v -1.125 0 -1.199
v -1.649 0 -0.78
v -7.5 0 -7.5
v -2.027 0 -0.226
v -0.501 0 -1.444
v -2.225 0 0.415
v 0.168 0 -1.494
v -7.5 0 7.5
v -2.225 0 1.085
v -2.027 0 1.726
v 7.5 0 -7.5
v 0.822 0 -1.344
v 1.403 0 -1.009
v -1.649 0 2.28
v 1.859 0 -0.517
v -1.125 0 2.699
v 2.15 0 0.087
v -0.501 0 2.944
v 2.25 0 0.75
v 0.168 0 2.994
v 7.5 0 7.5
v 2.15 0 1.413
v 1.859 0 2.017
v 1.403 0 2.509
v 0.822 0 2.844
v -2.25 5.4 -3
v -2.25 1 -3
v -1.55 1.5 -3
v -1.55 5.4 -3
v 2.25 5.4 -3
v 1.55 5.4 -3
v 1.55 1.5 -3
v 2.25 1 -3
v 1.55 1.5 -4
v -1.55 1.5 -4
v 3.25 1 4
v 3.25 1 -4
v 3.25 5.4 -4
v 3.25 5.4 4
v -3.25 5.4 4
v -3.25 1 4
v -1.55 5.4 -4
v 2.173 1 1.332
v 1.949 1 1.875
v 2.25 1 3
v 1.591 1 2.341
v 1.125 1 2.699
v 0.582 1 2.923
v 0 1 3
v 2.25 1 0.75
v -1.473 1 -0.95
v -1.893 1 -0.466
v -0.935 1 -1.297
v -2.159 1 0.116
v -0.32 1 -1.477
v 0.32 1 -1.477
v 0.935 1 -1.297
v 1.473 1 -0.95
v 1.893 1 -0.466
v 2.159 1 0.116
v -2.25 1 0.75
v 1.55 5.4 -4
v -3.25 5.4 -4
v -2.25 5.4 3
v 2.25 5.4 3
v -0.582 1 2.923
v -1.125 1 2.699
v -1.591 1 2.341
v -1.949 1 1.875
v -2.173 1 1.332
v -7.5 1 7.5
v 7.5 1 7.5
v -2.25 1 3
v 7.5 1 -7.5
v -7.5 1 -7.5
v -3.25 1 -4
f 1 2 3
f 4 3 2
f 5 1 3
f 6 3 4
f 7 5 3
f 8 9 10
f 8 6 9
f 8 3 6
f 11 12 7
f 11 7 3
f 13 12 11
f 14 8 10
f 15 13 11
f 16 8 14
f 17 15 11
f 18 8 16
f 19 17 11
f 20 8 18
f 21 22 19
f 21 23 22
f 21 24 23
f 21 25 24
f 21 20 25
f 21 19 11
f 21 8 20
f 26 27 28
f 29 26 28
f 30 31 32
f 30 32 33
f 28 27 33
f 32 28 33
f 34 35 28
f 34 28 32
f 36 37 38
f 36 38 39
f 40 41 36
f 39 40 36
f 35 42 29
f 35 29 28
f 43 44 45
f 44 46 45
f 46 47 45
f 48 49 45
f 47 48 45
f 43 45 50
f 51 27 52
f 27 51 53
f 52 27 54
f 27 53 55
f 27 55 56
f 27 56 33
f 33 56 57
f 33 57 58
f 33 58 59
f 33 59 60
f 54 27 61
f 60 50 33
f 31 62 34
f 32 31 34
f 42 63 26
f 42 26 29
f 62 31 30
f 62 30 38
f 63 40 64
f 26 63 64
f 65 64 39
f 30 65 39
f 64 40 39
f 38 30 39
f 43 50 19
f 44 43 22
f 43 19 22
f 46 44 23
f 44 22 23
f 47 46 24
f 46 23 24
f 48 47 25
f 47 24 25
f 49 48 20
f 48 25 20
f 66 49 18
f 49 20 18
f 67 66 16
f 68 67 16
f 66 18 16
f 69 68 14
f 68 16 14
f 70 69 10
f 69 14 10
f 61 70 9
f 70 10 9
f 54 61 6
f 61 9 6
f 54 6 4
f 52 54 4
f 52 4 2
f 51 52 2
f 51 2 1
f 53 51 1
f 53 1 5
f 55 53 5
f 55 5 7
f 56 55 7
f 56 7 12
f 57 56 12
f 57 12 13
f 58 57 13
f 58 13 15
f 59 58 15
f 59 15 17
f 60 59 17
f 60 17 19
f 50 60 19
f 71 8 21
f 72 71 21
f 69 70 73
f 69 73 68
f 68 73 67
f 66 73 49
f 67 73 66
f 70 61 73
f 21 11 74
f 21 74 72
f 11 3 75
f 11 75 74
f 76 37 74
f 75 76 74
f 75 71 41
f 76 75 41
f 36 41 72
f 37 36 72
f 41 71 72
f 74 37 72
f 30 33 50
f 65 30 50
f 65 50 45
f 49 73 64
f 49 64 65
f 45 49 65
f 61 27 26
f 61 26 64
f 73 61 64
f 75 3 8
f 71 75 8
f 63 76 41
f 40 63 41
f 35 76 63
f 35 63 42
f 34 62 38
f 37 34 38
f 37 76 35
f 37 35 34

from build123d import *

# Parameters (mm, degrees)
F0_W     = 6.5
F0_H     = 8
F1_DEPTH = 5.4
F2_T     = -1
F3_W     = 3.1
F3_H     = 3.9
F4_DEPTH = 1
F5_W     = 15
F5_H     = 15
F6_DEPTH = 1
F7_R     = 2.25
F8_DEPTH = 25


with BuildPart() as f1:
    # F0 (on Front) → F1 (new body)
    with BuildSketch(Plane.XZ):
        Rectangle(F0_W, F0_H)
    extrude(amount=-F1_DEPTH)

    # F2
    f2_openings = [f1.faces().sort_by_distance(p)[0] for p in [
        (0, 5.4, 0),
    ]]
    offset(amount=F2_T, openings=f2_openings)

    # F3 (on face) → F4 (cut)
    with BuildSketch(Plane(origin=(0, 0, -4), x_dir=(1, 0, 0), z_dir=(0, 0, -1))):
        with Locations((0, -3.45)):
            Rectangle(F3_W, F3_H)
    extrude(amount=-F4_DEPTH, mode=Mode.SUBTRACT)

    # F5 (on face) → F6 (join)
    with BuildSketch(Plane.XZ):
        Rectangle(F5_W, F5_H)
    extrude(amount=-F6_DEPTH)

    # F7 (on face) → F8 (cut)
    with BuildSketch(Plane.XZ):
        with Locations((0, 0.75)):
            Circle(F7_R)
    extrude(amount=-F8_DEPTH, mode=Mode.SUBTRACT)


solid = f1.part
